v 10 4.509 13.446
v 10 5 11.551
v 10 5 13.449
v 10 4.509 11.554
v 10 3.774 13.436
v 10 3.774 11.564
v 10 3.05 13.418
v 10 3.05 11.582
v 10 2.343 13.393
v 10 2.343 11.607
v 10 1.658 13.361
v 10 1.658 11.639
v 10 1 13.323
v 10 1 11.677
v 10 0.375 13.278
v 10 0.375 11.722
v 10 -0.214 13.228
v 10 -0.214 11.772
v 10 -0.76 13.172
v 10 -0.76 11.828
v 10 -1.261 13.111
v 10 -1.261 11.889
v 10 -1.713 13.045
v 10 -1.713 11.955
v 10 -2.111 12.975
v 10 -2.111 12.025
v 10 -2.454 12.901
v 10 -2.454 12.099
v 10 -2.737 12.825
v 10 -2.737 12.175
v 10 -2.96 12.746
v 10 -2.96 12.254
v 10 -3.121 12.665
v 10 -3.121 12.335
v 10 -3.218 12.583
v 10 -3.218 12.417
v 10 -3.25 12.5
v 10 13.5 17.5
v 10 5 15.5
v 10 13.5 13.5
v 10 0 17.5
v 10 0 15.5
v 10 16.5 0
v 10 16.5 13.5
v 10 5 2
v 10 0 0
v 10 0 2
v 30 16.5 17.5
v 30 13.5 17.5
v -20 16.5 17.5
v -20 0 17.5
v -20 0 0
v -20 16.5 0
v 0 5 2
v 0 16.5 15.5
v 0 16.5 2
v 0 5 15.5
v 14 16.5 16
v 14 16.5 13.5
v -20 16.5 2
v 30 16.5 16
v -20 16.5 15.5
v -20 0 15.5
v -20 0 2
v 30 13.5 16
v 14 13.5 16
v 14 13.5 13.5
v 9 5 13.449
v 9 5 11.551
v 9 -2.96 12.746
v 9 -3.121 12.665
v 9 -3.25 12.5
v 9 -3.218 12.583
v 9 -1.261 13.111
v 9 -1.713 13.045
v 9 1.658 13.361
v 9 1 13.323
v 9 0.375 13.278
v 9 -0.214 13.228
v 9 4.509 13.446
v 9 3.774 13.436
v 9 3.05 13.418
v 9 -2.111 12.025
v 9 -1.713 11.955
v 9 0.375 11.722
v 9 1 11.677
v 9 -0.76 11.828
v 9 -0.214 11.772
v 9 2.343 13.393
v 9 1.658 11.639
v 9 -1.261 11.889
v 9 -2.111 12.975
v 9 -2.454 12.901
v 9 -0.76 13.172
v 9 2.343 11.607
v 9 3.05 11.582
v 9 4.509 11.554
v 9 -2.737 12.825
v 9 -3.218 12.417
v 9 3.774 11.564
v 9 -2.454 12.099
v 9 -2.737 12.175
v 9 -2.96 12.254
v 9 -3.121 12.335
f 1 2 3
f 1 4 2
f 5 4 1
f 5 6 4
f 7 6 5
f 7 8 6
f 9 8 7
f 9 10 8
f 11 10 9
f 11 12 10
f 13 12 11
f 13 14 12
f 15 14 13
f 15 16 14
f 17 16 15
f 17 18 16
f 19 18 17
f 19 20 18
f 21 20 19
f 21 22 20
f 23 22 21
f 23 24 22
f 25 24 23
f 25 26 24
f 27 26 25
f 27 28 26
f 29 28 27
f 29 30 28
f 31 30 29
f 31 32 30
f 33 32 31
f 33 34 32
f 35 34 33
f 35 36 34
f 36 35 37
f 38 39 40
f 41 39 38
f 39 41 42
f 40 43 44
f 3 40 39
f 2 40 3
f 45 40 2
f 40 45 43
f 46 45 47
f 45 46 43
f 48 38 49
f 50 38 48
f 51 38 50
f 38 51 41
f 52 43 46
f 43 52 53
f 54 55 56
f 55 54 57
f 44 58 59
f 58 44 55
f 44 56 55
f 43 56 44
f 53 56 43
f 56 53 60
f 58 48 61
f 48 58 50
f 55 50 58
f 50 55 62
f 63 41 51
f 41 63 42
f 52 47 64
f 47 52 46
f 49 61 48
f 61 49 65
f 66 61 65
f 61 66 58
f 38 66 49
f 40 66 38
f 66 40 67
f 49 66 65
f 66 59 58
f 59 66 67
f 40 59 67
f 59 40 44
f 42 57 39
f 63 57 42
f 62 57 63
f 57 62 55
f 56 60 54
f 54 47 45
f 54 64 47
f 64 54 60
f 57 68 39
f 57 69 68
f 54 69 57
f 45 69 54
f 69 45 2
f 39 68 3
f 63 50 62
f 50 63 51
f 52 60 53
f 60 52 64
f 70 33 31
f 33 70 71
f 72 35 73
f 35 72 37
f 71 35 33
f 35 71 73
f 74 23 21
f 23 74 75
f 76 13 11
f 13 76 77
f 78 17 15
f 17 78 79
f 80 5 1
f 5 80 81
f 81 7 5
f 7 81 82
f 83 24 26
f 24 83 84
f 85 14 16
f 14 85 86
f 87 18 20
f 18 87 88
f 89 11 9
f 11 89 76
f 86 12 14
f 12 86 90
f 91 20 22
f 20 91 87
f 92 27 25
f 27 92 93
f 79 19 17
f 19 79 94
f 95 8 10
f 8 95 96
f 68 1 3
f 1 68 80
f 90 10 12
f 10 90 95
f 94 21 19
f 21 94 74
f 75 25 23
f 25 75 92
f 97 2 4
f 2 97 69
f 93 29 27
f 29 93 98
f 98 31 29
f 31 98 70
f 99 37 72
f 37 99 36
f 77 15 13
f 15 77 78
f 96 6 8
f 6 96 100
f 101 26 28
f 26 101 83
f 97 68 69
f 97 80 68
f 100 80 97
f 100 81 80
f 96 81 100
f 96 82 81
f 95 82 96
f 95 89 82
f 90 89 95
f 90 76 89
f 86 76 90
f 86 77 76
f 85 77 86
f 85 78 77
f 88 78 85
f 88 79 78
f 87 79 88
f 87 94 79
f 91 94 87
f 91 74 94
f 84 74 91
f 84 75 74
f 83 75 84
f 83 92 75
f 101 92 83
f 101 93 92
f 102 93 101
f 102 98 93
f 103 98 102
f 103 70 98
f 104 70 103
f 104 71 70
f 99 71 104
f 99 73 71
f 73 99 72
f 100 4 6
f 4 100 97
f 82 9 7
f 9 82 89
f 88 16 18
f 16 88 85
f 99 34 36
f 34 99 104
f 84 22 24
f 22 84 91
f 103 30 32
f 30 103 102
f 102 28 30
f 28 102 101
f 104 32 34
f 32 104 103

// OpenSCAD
carriage_length = 10;
carriage_depth = 5;
carriage_height = 13.5;

pin_length = 8.5;
pin_width = 1.9;
pin_height = 1;

endstop_length = 21;
endstop_width = 3;
endstop_height = 1.5;

endstop_offset = 9.5;

wall_thickness = 2;

difference(){
    union() {
        // the part that fits the extruder carriage
        cube([carriage_length, carriage_depth+wall_thickness+endstop_offset, carriage_height+wall_thickness*2]);
        
        // the part that will hit the endstop
        translate([carriage_length-1, carriage_depth-2+wall_thickness/2+endstop_offset, carriage_height+wall_thickness+.5]) {
            cube([endstop_length, endstop_width, endstop_height]);
        }
        
        translate([carriage_length, carriage_depth-2+wall_thickness/2+endstop_offset, carriage_height+wall_thickness-2]) {
            cube([4, 3, 4]);
        }
    }
    // make the hole in the carriage fit 
    translate([0, -1, wall_thickness])
        cube([carriage_length+2.1, carriage_depth+wall_thickness/2, carriage_height]);
}

difference() {
    translate([-20, 0, 0]) {
        cube([20, carriage_depth+wall_thickness+endstop_offset, carriage_height+wall_thickness*2]);
    }
    
    translate([-21, -1, wall_thickness]) {
        cube([21, carriage_depth+endstop_offset+wall_thickness+2, carriage_height]);
    }
}
// the pin that holds everything in place
translate([carriage_length - pin_height, pin_length/2+wall_thickness/2, carriage_height-1]) {
    rotate([0, 90, 0]) {
        difference () {
            linear_extrude(pin_height) {
                sma = pin_width/2;  // semi-minor axis
                smb = pin_length;  // semi-major axis
                polygon(
                    [ for (a = [0 : 5 : 359]) [ sma * sin(a), smb * cos(a) ] ]
                );
            }
        }
        
    }
}
